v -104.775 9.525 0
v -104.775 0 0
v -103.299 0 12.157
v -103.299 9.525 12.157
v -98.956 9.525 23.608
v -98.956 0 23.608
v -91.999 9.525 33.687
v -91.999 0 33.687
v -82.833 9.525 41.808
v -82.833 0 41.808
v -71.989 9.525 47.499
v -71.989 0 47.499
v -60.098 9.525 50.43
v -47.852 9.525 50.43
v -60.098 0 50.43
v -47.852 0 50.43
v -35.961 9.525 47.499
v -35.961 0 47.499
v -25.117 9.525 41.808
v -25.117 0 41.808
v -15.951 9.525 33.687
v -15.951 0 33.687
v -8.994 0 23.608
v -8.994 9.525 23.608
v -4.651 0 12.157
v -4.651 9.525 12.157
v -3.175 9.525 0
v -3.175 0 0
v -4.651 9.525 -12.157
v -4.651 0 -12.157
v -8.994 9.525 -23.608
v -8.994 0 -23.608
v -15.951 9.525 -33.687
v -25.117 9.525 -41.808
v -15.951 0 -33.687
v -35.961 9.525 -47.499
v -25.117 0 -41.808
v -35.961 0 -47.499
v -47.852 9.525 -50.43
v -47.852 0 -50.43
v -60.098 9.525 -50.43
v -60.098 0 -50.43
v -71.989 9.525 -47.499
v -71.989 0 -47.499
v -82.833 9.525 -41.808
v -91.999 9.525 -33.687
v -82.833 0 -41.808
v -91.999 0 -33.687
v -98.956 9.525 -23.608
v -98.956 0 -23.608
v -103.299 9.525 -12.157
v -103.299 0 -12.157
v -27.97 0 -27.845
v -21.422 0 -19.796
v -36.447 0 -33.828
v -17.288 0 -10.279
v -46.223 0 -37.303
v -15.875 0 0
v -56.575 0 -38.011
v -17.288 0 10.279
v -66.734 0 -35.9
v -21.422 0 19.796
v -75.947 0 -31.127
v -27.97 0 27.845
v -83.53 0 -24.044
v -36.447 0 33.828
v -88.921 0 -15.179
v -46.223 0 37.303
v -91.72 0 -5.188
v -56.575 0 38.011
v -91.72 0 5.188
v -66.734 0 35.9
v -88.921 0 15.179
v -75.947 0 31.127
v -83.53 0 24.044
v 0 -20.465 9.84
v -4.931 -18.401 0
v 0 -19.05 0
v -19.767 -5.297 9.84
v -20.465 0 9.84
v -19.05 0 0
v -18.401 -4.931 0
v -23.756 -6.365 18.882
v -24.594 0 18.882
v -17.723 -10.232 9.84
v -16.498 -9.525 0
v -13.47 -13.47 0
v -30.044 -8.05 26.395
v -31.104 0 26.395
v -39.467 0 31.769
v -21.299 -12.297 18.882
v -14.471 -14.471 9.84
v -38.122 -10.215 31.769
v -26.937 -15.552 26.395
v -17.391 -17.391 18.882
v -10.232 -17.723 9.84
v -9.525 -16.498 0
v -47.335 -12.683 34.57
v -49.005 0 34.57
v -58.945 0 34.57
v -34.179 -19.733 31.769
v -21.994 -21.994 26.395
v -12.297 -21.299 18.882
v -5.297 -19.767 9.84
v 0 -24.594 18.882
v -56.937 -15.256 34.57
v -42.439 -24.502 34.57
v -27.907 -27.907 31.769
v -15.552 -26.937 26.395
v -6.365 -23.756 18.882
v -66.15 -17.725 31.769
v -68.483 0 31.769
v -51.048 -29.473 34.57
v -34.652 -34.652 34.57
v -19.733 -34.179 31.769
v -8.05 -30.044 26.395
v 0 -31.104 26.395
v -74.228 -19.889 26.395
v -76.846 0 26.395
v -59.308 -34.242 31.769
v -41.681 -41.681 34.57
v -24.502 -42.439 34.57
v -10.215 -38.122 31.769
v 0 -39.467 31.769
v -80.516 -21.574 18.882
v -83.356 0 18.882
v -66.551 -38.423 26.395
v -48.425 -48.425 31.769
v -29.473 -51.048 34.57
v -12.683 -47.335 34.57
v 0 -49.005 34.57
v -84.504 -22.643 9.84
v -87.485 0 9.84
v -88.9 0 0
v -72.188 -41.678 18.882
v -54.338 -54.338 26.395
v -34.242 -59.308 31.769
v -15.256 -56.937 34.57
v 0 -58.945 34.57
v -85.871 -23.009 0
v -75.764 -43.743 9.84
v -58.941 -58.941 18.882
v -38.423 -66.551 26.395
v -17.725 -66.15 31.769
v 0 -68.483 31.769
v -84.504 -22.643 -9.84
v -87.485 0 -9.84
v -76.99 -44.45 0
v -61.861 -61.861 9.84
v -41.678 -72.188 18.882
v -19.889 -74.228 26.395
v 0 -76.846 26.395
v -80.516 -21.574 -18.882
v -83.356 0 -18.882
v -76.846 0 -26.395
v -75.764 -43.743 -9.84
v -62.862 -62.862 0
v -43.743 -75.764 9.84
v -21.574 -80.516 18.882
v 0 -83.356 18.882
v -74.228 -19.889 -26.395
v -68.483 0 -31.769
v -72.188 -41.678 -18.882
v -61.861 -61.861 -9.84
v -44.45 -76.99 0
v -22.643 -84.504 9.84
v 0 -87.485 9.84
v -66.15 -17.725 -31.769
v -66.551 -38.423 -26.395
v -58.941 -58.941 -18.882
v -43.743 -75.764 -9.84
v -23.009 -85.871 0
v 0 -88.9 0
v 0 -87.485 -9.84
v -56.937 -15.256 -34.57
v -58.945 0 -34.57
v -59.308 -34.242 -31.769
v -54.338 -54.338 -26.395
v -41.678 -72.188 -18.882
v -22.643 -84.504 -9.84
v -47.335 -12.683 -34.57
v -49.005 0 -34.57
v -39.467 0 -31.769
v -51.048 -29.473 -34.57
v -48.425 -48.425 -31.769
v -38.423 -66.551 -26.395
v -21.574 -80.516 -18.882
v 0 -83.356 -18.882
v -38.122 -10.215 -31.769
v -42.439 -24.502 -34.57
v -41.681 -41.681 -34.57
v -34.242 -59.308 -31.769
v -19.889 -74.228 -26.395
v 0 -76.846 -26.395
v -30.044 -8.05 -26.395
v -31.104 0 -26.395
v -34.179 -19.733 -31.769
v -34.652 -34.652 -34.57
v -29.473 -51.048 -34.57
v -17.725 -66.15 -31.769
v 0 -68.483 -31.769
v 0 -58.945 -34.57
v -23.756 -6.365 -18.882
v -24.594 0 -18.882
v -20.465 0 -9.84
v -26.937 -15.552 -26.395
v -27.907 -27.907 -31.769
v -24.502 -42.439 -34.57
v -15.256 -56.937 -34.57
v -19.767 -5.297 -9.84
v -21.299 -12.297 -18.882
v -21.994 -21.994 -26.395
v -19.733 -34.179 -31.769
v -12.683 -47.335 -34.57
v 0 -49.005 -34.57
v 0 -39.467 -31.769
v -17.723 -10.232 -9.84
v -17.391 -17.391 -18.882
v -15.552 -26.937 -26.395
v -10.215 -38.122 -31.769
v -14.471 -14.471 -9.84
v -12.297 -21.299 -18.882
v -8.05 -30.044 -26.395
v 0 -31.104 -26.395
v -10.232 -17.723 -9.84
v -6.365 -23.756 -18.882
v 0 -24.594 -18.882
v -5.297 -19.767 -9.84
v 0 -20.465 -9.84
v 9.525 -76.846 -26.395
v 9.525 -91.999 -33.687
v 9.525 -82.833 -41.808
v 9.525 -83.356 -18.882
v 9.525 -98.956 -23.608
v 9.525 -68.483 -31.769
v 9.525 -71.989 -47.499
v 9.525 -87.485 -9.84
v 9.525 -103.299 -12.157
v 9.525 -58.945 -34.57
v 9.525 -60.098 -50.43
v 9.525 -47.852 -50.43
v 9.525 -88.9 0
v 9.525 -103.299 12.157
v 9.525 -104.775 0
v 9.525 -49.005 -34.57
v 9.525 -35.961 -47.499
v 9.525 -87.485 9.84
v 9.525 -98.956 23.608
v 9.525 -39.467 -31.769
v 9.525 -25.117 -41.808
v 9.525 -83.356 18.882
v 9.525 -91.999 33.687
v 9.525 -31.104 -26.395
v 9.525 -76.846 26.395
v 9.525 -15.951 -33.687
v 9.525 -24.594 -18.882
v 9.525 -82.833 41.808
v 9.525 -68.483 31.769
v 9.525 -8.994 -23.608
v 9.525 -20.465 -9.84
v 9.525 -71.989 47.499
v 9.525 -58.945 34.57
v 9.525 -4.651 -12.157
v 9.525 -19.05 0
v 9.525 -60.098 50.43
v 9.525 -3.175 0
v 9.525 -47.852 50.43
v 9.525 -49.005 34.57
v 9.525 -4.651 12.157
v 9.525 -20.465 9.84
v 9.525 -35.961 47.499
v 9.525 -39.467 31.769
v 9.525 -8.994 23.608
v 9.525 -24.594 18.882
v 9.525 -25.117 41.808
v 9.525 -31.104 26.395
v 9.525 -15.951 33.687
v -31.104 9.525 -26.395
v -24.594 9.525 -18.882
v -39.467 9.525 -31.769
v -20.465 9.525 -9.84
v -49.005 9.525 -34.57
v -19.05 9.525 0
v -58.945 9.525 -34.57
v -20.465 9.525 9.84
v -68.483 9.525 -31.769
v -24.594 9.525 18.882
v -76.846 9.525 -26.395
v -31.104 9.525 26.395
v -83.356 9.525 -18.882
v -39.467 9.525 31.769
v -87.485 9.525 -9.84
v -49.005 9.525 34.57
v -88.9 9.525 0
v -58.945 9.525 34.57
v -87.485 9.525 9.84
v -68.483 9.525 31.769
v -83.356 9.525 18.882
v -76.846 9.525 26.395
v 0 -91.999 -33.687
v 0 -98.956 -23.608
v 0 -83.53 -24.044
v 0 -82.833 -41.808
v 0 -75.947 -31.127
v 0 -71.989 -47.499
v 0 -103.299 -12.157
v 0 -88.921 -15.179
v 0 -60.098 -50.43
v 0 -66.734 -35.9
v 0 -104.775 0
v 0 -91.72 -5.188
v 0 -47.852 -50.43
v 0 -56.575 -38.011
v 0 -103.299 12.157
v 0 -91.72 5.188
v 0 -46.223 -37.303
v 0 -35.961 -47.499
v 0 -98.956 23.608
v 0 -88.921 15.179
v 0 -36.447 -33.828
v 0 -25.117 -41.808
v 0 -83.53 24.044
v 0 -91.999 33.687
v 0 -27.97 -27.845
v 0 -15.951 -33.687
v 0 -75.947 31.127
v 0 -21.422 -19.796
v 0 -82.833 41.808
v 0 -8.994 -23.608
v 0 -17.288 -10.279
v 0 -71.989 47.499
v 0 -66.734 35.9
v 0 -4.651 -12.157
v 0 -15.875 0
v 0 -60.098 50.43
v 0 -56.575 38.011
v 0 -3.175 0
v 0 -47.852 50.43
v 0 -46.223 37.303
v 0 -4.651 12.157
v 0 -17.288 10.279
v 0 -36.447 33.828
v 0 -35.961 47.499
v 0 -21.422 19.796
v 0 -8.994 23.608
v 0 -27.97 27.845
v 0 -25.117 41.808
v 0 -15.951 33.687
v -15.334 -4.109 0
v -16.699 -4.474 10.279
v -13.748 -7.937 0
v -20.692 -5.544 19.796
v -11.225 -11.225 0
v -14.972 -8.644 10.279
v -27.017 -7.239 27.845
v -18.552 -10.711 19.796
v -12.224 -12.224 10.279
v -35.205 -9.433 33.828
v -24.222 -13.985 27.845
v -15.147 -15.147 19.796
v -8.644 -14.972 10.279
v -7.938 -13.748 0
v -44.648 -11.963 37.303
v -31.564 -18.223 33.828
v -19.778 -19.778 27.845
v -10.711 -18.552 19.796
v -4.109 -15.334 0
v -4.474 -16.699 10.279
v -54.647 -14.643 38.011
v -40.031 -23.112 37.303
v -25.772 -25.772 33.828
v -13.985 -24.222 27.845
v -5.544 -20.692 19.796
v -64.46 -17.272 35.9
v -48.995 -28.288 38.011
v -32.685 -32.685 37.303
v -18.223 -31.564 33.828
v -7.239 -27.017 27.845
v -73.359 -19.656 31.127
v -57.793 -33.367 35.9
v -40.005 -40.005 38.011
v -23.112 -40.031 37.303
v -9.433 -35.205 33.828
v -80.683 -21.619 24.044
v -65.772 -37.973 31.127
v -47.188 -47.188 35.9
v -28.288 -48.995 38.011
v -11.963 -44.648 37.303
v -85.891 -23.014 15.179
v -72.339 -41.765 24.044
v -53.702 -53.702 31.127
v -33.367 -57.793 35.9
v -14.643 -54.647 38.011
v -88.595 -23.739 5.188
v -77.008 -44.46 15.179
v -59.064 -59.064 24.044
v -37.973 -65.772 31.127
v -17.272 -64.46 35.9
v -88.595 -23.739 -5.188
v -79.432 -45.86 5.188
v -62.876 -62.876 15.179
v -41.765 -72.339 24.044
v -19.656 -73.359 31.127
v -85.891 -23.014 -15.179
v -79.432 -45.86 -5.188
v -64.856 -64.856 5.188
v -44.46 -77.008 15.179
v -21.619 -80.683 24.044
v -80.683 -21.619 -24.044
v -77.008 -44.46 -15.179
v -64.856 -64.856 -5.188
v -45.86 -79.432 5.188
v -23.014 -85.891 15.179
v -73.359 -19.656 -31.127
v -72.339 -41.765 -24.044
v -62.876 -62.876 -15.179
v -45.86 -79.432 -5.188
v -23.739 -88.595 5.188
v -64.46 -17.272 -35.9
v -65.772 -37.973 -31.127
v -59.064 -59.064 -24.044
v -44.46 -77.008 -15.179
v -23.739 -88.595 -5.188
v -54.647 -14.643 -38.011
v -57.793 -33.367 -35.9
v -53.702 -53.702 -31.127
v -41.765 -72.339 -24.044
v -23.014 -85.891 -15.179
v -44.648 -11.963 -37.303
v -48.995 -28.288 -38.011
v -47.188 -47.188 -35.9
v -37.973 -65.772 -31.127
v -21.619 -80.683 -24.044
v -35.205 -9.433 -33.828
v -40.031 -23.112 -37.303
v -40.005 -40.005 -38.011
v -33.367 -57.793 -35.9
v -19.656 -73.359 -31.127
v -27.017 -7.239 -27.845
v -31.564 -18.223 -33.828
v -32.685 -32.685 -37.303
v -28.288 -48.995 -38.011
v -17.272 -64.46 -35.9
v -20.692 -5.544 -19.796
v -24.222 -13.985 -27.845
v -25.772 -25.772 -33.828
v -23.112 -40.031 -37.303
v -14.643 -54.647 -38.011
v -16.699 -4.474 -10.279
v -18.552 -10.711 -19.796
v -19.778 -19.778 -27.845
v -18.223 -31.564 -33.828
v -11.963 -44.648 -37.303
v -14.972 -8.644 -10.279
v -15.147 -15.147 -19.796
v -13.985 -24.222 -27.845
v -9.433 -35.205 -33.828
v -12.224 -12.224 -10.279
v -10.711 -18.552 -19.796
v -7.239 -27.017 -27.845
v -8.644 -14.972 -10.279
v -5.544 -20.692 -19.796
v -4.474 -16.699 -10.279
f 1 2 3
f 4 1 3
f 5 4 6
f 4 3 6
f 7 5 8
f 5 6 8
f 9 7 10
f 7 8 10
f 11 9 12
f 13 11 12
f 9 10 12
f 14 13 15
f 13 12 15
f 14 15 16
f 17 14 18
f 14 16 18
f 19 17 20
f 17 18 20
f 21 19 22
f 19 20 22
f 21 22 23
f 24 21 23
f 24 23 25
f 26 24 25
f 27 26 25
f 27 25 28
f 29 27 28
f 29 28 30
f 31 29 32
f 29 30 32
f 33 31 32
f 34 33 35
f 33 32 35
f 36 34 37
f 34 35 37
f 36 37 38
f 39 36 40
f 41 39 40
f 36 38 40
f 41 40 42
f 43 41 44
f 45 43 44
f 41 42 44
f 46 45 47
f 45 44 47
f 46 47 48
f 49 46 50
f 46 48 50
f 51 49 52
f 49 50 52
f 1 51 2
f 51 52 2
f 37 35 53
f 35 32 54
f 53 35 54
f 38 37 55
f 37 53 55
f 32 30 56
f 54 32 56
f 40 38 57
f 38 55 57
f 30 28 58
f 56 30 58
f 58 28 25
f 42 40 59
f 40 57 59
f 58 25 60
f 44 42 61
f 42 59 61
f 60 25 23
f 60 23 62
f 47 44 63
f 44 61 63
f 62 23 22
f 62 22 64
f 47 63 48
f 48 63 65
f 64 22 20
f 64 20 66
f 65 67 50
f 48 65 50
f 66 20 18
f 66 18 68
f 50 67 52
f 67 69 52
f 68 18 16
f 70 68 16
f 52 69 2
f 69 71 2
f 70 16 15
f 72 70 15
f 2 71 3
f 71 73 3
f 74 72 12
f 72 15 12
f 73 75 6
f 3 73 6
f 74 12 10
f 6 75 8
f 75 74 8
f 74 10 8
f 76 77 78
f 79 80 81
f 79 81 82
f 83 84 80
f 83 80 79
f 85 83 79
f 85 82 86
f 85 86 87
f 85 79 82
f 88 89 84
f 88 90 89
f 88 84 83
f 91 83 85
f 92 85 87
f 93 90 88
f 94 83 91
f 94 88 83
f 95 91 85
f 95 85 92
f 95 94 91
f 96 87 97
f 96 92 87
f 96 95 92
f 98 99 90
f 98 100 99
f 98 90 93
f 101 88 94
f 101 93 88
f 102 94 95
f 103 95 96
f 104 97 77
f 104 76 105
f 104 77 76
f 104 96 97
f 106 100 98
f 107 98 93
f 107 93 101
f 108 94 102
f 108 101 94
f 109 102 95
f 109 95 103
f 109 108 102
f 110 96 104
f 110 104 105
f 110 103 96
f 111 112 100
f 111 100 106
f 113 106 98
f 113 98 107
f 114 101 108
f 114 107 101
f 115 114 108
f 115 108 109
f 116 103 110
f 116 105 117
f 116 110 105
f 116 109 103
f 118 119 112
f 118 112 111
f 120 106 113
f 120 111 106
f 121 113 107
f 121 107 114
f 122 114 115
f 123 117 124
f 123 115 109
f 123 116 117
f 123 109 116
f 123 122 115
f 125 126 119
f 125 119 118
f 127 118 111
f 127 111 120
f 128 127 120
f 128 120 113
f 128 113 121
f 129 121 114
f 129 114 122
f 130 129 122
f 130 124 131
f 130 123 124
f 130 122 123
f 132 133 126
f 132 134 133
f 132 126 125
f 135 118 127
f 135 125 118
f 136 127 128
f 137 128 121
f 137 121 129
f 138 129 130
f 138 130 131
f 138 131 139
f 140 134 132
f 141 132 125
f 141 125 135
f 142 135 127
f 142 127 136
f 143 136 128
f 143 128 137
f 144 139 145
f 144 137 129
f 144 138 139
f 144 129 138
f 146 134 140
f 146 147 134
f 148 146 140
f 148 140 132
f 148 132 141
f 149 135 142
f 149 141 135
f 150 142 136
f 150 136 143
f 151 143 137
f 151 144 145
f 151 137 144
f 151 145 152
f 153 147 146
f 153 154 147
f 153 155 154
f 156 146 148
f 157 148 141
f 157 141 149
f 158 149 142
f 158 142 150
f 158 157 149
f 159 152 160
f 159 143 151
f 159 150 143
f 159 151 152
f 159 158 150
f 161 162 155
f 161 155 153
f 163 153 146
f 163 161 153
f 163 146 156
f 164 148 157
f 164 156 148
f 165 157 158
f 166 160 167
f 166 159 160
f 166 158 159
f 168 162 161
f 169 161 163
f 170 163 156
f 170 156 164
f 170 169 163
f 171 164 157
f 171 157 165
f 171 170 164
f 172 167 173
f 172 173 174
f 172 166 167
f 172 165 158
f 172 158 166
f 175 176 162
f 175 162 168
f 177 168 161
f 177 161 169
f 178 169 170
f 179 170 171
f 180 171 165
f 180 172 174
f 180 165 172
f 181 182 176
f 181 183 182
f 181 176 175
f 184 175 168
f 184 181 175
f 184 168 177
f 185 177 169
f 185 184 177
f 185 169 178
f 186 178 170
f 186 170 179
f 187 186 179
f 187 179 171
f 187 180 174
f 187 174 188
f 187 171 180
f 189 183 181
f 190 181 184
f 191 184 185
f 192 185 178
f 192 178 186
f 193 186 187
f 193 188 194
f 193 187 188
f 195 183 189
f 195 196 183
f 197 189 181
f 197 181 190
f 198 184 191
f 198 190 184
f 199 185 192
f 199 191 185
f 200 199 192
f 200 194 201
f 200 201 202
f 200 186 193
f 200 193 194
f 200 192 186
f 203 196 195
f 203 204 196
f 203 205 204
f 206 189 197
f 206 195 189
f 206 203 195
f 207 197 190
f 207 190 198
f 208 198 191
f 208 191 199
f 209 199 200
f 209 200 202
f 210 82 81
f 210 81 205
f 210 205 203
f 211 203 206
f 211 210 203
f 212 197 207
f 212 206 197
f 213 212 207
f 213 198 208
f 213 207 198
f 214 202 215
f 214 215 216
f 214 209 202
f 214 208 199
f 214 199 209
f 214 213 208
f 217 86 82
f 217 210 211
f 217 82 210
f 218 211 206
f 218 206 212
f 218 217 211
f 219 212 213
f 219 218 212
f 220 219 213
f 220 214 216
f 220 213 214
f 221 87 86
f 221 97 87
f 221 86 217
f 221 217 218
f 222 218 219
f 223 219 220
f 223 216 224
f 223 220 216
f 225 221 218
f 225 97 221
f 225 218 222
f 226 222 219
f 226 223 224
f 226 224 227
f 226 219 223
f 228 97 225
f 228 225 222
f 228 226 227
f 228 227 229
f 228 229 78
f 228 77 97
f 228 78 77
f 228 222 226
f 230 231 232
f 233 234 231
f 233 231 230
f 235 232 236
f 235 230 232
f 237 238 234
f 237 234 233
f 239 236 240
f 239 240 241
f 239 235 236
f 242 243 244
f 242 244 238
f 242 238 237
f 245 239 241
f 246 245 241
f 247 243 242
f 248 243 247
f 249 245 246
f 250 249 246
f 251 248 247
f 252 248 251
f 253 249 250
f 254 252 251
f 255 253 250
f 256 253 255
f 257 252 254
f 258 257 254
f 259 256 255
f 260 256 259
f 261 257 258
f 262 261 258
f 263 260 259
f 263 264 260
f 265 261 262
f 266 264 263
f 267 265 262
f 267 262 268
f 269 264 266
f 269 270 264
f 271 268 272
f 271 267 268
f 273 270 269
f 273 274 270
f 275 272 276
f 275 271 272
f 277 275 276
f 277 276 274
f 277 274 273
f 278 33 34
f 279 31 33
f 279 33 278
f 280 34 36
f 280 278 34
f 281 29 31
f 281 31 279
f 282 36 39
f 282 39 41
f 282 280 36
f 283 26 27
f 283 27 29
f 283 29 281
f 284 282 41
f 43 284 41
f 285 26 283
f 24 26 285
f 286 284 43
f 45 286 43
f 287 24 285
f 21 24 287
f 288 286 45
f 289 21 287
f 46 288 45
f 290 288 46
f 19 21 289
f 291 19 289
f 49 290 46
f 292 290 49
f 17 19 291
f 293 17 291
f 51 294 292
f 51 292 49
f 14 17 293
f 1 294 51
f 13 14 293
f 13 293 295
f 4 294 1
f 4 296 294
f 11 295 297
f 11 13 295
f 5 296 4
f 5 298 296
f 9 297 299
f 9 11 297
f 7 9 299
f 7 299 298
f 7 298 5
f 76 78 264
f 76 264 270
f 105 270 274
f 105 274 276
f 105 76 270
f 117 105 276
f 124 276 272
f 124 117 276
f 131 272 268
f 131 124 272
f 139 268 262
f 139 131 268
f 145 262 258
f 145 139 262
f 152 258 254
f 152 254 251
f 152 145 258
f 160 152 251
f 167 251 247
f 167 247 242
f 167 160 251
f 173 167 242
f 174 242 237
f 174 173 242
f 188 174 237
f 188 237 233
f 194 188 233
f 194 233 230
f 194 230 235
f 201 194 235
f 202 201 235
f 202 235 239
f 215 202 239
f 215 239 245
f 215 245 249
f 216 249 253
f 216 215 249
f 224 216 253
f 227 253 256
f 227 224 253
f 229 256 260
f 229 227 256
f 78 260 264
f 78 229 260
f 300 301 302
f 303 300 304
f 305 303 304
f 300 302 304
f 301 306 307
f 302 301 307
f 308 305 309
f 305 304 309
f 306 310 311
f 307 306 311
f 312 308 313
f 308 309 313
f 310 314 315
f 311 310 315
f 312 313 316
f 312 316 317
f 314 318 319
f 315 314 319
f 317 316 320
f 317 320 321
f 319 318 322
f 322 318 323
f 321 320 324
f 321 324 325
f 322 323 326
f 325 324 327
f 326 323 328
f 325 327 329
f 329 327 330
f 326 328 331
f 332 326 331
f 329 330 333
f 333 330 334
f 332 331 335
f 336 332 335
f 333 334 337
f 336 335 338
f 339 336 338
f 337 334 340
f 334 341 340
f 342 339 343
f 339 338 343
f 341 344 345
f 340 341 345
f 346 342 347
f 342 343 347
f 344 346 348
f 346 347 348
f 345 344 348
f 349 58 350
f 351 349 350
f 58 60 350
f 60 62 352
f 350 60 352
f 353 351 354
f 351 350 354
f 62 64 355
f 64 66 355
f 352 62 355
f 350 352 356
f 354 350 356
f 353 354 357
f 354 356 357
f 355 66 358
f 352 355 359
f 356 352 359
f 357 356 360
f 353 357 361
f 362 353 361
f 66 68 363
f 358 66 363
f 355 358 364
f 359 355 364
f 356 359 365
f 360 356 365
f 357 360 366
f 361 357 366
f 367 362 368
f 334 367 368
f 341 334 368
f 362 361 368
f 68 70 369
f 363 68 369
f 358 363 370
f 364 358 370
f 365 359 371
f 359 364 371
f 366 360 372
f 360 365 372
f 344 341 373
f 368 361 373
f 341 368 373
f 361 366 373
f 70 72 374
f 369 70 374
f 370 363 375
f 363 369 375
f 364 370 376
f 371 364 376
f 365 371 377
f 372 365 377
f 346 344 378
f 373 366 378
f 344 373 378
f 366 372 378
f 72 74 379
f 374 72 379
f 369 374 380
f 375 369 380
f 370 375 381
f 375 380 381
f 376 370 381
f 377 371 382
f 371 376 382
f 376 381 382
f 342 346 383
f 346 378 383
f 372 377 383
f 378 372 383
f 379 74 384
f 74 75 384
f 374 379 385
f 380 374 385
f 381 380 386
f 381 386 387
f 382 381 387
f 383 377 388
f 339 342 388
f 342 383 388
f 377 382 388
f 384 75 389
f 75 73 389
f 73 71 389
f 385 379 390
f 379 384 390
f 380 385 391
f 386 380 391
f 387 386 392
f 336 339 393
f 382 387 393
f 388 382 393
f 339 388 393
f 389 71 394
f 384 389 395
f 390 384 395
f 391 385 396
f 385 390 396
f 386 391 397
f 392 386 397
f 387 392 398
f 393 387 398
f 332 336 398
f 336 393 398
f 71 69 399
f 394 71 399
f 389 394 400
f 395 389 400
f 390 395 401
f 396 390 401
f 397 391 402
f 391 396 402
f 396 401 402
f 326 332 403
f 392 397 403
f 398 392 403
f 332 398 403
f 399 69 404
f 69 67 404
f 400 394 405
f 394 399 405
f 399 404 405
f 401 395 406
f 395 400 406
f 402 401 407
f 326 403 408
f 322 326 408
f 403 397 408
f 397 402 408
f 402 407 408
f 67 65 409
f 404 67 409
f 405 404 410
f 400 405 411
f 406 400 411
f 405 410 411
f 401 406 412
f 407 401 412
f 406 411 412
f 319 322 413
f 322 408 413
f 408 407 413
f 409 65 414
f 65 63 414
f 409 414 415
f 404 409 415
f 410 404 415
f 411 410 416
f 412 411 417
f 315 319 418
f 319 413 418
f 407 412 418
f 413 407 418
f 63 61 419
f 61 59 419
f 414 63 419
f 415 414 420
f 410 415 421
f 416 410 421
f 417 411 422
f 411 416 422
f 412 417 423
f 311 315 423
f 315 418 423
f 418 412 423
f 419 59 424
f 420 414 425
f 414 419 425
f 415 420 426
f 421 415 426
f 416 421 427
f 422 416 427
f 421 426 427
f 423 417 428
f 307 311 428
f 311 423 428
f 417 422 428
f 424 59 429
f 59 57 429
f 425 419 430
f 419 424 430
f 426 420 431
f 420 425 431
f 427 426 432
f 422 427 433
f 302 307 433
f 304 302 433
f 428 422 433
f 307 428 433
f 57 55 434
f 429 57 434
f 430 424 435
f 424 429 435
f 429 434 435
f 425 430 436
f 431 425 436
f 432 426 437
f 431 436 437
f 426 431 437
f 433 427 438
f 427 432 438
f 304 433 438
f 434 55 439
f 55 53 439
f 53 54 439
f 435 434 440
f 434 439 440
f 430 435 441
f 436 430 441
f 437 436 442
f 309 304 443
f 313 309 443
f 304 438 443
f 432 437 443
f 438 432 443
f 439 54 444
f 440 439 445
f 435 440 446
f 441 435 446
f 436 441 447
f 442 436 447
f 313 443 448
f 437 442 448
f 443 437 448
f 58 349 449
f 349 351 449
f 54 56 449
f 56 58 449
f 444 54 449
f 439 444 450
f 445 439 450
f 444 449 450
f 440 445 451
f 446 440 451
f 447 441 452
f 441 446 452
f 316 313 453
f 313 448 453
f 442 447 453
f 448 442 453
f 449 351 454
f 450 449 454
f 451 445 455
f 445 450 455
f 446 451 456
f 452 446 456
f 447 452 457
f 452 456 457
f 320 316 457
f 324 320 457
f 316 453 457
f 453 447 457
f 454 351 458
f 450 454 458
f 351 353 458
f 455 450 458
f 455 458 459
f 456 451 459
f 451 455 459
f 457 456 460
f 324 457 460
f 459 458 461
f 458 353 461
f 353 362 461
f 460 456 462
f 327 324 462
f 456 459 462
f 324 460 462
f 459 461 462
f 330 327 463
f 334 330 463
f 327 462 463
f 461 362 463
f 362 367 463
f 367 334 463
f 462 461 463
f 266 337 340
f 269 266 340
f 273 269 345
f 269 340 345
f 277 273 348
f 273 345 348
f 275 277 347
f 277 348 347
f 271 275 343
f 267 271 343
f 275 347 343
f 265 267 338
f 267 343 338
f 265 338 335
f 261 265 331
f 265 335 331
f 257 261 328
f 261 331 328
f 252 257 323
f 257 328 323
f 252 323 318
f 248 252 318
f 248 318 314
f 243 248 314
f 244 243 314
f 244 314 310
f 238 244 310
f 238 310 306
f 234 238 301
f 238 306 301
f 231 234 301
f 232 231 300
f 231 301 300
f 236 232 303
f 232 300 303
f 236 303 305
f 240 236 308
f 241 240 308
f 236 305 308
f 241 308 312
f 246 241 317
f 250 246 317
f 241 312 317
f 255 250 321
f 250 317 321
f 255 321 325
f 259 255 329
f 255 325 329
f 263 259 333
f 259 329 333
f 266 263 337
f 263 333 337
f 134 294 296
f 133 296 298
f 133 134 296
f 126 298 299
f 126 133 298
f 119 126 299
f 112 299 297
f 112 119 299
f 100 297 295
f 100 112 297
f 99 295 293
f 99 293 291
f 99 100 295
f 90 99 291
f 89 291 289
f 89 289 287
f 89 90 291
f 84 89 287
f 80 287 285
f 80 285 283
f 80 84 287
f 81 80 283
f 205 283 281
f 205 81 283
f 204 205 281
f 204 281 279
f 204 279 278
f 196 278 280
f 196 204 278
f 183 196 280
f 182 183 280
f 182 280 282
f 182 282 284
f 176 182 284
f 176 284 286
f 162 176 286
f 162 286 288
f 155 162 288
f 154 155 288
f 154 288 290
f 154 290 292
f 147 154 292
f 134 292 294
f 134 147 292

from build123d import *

# Parameters (mm, degrees)
F0_R     = 38.1
F0_R_2   = 34.925
F1_ANGLE = 90
F2_R     = 50.8
F2_R_2   = 34.925
F3_DEPTH = 9.525
F4_R     = 50.8
F4_R_2   = 34.925
F5_DEPTH = 9.525


with BuildPart() as f1:
    # F0 (on Front) → F1 (revolve)
    with BuildSketch(Plane.XZ):
        with Locations((-53.975, 0)):
            Circle(F0_R)
        with Locations((-53.975, 0)):
            Circle(F0_R_2, mode=Mode.SUBTRACT)
    revolve(axis=Axis((0, 0, 27.08186), (0, 0, 1)), revolution_arc=F1_ANGLE)

    # F2 (on face) → F3 (join)
    with BuildSketch(Plane.YZ):
        with Locations((-53.975, 0)):
            Circle(F2_R)
        with Locations((-53.975, 0)):
            Circle(F2_R_2, mode=Mode.SUBTRACT)
    extrude(amount=F3_DEPTH)

    # F4 (on face) → F5 (join)
    with BuildSketch(Plane(origin=(0, 0, 0), x_dir=(-1, 0, 0), z_dir=(0, 1, 0))):
        with Locations((53.975, 0)):
            Circle(F4_R)
        with Locations((53.975, 0)):
            Circle(F4_R_2, mode=Mode.SUBTRACT)
    extrude(amount=F5_DEPTH)


solid = f1.part
